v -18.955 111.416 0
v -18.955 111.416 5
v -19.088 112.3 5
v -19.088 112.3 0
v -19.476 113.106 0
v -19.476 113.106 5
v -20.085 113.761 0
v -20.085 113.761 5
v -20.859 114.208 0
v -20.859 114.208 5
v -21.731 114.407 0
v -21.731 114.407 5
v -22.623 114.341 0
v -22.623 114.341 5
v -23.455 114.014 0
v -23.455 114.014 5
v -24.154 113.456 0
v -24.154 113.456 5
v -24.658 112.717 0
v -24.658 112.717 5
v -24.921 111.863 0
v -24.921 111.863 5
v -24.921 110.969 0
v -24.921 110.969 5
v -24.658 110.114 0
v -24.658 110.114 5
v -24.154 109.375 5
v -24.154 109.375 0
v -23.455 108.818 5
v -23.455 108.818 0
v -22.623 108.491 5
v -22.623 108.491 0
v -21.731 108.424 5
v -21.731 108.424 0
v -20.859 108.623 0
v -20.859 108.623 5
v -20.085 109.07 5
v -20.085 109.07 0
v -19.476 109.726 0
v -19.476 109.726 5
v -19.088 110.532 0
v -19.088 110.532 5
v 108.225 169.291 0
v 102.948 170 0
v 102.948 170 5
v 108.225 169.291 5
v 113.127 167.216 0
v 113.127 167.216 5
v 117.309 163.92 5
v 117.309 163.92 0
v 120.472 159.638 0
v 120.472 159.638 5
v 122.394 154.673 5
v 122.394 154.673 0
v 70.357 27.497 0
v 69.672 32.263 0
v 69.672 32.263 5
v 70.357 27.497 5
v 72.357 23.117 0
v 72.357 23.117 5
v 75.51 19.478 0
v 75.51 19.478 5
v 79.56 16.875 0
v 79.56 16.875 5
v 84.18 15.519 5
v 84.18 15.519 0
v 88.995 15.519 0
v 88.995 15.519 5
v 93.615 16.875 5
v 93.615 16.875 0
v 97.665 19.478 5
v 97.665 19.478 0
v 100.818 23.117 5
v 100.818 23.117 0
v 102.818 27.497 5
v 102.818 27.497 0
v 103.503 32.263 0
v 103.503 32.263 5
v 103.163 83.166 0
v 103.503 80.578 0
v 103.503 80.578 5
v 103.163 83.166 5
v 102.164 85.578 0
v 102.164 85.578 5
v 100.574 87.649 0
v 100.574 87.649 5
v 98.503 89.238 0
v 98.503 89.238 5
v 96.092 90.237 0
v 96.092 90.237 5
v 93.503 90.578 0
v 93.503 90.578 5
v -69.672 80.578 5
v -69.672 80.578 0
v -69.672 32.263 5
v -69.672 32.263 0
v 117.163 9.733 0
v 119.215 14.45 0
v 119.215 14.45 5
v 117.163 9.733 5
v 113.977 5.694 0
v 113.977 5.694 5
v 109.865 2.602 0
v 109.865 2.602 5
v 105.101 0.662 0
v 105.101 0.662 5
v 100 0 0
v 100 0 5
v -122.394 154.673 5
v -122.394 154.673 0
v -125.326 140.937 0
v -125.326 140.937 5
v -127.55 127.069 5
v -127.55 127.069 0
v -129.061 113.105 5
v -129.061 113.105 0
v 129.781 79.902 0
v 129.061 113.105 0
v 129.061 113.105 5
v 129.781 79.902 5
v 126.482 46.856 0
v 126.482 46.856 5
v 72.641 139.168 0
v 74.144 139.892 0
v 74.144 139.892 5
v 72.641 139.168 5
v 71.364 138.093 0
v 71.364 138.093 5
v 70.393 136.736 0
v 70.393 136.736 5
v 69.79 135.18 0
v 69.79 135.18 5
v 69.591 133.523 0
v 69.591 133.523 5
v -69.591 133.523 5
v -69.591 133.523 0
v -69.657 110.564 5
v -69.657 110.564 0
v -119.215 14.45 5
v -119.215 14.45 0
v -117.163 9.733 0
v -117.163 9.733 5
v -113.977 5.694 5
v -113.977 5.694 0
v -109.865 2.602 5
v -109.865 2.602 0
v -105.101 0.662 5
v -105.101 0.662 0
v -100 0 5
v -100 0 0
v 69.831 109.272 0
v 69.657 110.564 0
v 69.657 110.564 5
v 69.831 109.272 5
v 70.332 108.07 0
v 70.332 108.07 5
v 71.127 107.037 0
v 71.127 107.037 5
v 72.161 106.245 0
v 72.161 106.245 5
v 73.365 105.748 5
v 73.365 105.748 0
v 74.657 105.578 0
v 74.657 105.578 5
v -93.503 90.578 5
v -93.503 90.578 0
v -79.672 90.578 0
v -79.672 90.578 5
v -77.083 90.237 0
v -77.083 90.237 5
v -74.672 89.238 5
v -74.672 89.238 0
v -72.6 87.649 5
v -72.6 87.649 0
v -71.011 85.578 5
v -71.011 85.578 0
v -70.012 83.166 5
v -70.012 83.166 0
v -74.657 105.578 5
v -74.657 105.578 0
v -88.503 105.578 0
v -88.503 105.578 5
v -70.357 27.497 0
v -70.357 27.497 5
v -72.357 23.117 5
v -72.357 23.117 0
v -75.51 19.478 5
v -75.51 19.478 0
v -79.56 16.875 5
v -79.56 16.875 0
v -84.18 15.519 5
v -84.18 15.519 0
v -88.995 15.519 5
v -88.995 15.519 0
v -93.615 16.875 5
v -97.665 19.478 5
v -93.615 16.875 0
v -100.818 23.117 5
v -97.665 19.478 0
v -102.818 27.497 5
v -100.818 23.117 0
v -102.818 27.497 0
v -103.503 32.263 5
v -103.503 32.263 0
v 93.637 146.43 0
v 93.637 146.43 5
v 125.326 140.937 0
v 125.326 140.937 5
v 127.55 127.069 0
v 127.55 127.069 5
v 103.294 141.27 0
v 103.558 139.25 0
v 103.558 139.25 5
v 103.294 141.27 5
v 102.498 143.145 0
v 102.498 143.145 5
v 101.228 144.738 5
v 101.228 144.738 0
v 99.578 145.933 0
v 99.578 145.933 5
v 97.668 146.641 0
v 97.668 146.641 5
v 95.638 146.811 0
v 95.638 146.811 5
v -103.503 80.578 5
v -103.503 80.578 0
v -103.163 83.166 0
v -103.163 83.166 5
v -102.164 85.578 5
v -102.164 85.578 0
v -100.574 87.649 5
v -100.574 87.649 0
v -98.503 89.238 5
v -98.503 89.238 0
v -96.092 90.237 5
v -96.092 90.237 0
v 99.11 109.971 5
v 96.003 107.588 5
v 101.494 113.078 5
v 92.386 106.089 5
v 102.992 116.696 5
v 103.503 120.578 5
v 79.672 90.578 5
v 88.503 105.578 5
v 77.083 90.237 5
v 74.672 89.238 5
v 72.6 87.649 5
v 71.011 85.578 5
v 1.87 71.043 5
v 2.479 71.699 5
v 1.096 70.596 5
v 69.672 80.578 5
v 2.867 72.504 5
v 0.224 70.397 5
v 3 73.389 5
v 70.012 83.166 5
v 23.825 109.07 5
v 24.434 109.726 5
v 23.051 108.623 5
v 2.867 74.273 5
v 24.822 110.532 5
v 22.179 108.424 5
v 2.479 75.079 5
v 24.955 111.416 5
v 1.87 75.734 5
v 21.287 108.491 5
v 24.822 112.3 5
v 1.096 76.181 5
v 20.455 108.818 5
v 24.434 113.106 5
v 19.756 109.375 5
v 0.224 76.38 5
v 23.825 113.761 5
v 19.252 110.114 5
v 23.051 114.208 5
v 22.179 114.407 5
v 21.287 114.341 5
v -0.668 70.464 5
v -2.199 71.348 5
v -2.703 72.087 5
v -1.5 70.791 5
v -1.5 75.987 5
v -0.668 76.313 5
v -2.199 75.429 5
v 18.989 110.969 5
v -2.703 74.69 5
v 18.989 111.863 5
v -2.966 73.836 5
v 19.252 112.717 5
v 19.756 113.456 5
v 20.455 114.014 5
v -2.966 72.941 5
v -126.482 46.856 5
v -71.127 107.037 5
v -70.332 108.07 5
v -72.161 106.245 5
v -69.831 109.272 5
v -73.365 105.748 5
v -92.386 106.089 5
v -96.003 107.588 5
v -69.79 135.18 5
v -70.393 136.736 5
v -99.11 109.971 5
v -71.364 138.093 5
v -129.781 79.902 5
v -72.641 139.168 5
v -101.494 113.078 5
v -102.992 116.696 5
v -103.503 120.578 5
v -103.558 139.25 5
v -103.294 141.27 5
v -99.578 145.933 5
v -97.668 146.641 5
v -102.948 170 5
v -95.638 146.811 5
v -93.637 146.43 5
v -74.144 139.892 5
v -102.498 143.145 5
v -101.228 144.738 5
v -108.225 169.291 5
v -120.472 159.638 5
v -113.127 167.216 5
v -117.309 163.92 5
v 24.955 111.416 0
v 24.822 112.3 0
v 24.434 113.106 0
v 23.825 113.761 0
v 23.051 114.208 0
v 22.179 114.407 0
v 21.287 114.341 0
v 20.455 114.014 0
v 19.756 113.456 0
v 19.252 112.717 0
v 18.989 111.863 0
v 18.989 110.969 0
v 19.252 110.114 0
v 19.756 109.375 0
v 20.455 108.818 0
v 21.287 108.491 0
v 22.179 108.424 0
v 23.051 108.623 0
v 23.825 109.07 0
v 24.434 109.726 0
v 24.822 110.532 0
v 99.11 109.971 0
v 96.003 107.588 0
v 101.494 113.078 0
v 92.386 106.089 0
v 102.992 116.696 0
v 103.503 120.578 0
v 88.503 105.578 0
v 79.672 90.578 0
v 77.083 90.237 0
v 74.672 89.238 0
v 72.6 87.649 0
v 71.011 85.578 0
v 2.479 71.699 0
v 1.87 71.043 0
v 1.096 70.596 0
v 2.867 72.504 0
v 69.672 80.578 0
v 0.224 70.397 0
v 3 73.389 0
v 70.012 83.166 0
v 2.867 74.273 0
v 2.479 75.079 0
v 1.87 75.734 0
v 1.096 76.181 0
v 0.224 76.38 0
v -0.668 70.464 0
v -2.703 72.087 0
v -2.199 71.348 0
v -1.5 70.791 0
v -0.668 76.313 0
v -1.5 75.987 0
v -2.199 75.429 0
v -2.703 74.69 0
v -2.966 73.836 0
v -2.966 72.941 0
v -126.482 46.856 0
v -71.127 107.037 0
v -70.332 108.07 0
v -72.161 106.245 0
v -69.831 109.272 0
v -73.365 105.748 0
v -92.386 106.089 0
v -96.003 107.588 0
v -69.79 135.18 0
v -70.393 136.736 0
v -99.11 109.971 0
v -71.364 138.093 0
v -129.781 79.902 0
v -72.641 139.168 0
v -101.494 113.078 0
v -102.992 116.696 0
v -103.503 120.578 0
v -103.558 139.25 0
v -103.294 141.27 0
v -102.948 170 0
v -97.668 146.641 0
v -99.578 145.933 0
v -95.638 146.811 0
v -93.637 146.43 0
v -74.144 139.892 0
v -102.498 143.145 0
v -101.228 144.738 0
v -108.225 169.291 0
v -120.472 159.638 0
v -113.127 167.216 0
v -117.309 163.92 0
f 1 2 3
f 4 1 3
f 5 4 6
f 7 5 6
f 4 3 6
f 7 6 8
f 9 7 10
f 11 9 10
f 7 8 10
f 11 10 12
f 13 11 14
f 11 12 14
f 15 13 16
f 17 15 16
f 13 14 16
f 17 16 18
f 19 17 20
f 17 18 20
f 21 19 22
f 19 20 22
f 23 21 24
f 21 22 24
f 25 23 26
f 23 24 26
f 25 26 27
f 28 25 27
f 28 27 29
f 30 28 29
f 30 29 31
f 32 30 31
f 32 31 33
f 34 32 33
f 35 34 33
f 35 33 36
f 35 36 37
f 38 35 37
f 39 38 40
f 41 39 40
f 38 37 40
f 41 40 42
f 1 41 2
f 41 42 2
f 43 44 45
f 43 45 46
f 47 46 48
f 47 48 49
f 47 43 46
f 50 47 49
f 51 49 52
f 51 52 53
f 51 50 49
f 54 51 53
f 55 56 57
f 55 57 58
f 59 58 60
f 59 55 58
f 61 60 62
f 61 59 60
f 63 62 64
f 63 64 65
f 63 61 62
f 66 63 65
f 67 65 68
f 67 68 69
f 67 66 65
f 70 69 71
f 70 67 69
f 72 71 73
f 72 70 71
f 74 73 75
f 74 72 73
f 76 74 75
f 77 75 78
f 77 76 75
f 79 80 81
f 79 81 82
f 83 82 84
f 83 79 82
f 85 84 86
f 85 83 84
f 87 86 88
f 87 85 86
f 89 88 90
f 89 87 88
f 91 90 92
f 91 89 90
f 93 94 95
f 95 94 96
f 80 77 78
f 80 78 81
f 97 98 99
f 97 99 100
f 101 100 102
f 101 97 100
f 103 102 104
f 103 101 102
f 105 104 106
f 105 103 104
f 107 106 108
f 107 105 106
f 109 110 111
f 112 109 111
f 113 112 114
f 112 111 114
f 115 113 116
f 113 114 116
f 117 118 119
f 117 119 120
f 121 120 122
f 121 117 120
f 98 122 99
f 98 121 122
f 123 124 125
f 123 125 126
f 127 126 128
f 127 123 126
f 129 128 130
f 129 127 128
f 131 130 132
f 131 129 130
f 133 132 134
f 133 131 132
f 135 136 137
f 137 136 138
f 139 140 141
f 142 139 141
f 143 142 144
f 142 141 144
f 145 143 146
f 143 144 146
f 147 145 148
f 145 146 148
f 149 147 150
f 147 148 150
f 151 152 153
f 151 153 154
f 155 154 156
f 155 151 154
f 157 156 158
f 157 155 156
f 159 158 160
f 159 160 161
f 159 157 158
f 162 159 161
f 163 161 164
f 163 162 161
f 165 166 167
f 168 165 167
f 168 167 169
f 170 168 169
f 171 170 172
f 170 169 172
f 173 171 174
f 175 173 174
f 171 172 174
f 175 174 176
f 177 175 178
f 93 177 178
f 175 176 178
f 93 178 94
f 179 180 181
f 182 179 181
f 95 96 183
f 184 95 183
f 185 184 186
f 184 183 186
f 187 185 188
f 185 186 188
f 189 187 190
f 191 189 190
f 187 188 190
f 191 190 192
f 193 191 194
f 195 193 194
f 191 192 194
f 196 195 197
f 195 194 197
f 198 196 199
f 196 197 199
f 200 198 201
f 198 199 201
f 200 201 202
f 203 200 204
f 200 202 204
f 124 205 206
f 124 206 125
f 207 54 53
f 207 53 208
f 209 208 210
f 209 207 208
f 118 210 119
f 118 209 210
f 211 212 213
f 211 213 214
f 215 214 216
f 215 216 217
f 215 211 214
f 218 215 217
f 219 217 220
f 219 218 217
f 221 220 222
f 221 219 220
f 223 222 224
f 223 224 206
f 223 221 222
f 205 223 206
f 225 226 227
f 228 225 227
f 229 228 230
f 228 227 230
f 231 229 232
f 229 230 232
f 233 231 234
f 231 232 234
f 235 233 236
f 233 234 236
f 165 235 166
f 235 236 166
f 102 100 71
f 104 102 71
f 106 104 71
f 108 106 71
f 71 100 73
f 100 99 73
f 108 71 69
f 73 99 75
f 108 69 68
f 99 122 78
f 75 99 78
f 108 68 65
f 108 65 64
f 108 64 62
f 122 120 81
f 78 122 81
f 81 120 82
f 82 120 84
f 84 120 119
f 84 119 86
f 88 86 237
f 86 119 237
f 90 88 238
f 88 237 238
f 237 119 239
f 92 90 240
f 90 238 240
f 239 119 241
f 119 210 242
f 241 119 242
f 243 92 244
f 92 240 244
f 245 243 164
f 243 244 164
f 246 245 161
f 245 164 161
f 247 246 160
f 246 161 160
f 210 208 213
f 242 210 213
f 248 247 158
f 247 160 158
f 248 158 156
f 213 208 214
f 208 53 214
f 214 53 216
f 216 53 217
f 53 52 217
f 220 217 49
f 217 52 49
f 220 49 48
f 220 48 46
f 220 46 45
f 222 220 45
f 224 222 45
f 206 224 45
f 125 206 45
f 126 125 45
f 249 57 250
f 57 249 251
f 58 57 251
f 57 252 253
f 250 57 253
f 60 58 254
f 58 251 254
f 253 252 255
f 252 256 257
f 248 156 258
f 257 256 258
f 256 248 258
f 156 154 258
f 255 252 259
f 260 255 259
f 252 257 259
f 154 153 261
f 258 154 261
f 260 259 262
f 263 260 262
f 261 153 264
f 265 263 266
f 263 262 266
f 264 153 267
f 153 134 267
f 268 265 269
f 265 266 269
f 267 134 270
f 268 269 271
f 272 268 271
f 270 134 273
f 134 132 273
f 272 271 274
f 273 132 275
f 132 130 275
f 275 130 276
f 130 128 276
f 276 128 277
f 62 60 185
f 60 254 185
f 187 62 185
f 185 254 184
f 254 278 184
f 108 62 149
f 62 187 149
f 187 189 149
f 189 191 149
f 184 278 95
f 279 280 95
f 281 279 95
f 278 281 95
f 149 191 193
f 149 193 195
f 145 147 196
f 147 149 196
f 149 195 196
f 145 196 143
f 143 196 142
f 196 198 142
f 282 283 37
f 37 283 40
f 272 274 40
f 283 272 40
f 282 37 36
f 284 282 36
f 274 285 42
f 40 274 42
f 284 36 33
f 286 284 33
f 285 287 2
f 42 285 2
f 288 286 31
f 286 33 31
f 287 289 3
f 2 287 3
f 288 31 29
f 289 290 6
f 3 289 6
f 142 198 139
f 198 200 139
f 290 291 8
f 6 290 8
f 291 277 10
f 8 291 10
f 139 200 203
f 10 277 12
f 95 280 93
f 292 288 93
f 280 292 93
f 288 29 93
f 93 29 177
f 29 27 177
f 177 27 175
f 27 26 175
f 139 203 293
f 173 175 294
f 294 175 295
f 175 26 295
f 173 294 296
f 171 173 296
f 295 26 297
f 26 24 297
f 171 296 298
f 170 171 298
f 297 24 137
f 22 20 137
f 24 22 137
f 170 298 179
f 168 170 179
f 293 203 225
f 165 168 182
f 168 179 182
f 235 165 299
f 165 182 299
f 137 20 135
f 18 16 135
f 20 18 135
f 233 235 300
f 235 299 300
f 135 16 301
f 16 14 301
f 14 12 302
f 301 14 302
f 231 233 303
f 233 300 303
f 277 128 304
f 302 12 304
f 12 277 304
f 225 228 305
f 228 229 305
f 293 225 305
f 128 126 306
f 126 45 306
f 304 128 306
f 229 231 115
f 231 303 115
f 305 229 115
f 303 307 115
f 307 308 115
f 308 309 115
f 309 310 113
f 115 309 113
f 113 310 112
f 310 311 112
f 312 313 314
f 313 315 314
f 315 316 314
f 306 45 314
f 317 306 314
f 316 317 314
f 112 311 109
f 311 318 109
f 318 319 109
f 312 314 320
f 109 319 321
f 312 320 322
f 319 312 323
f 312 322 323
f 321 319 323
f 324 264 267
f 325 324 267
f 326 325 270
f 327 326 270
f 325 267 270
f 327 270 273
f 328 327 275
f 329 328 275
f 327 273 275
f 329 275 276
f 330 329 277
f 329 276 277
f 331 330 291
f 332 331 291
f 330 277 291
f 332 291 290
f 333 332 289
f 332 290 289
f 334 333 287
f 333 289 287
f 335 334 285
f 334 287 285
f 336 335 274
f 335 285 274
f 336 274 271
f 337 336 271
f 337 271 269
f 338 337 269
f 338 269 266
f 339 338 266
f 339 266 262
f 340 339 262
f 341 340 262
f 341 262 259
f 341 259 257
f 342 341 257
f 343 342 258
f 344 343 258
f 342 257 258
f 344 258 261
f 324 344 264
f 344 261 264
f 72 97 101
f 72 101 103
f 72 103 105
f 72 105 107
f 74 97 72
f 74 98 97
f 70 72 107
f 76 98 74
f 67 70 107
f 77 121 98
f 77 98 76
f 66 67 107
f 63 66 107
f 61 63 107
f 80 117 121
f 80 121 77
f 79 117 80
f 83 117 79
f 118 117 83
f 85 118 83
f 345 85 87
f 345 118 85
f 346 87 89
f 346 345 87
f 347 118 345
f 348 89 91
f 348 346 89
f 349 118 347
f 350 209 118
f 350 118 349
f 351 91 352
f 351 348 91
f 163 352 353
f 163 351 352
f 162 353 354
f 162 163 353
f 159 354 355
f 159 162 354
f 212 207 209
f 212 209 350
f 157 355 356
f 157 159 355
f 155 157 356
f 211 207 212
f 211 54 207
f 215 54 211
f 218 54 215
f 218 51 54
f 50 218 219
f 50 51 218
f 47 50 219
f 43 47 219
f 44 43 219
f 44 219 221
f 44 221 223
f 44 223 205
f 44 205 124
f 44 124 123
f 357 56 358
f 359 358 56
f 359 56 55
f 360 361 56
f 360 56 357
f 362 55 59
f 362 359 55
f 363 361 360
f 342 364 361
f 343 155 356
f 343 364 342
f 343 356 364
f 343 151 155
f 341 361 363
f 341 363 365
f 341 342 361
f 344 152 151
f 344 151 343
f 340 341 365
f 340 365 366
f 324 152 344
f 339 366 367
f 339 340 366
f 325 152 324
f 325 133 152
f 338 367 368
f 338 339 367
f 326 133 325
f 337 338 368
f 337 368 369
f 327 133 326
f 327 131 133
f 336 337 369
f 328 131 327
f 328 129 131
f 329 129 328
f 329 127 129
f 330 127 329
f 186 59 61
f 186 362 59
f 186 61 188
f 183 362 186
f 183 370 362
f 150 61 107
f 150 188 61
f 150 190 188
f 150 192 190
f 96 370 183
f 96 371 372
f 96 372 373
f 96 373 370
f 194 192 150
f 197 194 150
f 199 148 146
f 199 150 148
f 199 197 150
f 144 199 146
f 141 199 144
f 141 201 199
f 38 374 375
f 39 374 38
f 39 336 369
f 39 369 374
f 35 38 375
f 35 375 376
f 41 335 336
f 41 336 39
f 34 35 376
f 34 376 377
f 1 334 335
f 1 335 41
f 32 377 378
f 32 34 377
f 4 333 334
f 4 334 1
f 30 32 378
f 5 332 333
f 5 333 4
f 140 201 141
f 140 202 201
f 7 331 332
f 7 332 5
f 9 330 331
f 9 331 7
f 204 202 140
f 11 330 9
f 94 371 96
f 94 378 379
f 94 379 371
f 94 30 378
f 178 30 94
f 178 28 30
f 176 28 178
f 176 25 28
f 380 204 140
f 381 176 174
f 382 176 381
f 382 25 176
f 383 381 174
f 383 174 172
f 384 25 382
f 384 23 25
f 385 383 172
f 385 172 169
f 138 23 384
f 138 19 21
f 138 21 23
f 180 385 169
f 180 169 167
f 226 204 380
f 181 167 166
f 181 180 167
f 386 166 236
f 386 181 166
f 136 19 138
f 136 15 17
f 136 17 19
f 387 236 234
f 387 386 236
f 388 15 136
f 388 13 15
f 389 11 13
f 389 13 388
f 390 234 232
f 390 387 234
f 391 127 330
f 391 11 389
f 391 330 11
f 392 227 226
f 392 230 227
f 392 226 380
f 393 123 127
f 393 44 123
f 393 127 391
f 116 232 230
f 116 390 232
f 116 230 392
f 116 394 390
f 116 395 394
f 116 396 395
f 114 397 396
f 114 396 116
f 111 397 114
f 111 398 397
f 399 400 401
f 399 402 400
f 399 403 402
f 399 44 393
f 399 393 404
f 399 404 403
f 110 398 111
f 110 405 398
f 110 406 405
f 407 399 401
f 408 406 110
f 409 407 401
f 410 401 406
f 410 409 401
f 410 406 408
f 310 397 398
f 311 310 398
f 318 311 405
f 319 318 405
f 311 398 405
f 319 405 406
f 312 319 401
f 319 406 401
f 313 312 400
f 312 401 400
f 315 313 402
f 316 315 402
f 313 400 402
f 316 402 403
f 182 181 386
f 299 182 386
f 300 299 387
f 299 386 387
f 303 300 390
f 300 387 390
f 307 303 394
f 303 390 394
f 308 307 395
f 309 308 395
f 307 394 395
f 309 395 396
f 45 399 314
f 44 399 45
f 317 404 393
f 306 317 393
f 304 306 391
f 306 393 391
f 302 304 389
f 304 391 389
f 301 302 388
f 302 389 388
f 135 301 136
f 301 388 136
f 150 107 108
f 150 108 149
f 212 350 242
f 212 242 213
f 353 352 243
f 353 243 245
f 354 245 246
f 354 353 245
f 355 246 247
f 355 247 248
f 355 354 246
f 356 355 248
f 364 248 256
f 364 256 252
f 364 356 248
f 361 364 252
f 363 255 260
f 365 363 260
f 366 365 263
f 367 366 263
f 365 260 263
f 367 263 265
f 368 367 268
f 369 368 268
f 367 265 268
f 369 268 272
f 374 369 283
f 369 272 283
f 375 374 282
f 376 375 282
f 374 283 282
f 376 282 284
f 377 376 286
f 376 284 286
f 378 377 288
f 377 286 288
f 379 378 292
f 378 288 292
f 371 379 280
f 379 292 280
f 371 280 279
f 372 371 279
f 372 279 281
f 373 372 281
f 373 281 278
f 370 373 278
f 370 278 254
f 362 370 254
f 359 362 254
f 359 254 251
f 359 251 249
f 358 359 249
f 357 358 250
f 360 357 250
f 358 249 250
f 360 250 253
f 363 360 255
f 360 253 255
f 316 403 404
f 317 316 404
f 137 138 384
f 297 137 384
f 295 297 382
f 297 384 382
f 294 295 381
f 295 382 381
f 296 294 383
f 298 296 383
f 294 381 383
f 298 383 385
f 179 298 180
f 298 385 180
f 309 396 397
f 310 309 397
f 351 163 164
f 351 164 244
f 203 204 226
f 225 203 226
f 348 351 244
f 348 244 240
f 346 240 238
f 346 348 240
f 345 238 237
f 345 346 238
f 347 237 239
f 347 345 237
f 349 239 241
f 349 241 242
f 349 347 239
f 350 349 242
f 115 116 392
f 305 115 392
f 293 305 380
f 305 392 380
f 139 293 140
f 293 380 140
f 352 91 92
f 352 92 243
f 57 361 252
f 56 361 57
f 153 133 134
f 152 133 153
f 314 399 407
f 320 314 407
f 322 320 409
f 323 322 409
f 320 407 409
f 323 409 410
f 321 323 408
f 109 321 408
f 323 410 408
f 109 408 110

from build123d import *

# Parameters (mm, degrees)
DODANIE_WYCI_GNI_CIE1_DEPTH = 5
SZKIC3_R                    = 3
WYTNIJ_WYCI_GNI_CIE1_DEPTH  = 5


with BuildPart() as part:
    # Szkic1 → Dodanie-wyciągnięcie1 (new body)
    with BuildSketch(Plane.XY):
        with BuildLine():
            Line((-100, 0), (0, 0))
            Line((0, 0), (0, 170))
            Line((0, 170), (-102.948040342, 170))
            ThreePointArc((-102.948040342, 170), (-115.328169963, 165.707717548), (-122.394398271, 154.673239056))
            ThreePointArc((-122.394398271, 154.673239056), (-126.526512484, 134.017204351), (-129.061437885, 113.105))
            ThreePointArc((-129.061437885, 113.105), (-128.631920304, 63.328972076), (-119.214524038, 14.4500391))
            ThreePointArc((-119.214524038, 14.4500391), (-112.020831544, 4.015644868), (-100, 0))
        make_face()
        with BuildLine():
            ThreePointArc((-103.503346853, 80.578026571), (-100.574414665, 87.649094383), (-93.503346853, 90.578026571))
            Line((-93.503346853, 90.578026571), (-79.671539283, 90.578026571))
            ThreePointArc((-79.671539283, 90.578026571), (-72.600471471, 87.649094383), (-69.671539283, 80.578026571))
            Line((-69.671539283, 80.578026571), (-69.671539283, 32.262674049))
            ThreePointArc((-69.671539283, 32.262674049), (-86.587443068, 15.346770264), (-103.503346853, 32.262674049))
            Line((-103.503346853, 32.262674049), (-103.503346853, 80.578026571))
        make_face(mode=Mode.SUBTRACT)
        with BuildLine():
            Line((-103.503346853, 120.578026571), (-103.557564737, 139.250268571))
            ThreePointArc((-103.557564737, 139.250268571), (-100.443696898, 145.391700798), (-93.636751398, 146.430380577))
            Line((-93.636751398, 146.430380577), (-74.144065049, 139.891934241))
            ThreePointArc((-74.144065049, 139.891934241), (-70.835961623, 137.44494736), (-69.590709059, 133.523131566))
            Line((-69.590709059, 133.523131566), (-69.657118792, 110.563564309))
            ThreePointArc((-69.657118792, 110.563564309), (-71.126680855, 107.037383175), (-74.657097877, 105.578026571))
            Line((-74.657097877, 105.578026571), (-88.503346853, 105.578026571))
            ThreePointArc((-88.503346853, 105.578026571), (-99.109948571, 109.971424853), (-103.503346853, 120.578026571))
        make_face(mode=Mode.SUBTRACT)
    dodanie_wyci_gni_cie1 = extrude(amount=DODANIE_WYCI_GNI_CIE1_DEPTH)

    # Lustro1: Dodanie-wyciągnięcie1 across plane
    add(dodanie_wyci_gni_cie1.mirror(Plane(origin=(0, 0, 5), x_dir=(0, 0, 1), z_dir=(-1, 0, 0))))

    # Szkic3 → Wytnij-wyciągnięcie1 (cut)
    with BuildSketch(Plane.XY.offset(5)):
        with Locations((0, 73.388617168)):
            Circle(SZKIC3_R)
        with Locations((-21.955, 111.415792648)):
            Circle(SZKIC3_R)
        with Locations((21.955, 111.415792648)):
            Circle(SZKIC3_R)
    extrude(amount=-WYTNIJ_WYCI_GNI_CIE1_DEPTH, mode=Mode.SUBTRACT)


solid = part.part
